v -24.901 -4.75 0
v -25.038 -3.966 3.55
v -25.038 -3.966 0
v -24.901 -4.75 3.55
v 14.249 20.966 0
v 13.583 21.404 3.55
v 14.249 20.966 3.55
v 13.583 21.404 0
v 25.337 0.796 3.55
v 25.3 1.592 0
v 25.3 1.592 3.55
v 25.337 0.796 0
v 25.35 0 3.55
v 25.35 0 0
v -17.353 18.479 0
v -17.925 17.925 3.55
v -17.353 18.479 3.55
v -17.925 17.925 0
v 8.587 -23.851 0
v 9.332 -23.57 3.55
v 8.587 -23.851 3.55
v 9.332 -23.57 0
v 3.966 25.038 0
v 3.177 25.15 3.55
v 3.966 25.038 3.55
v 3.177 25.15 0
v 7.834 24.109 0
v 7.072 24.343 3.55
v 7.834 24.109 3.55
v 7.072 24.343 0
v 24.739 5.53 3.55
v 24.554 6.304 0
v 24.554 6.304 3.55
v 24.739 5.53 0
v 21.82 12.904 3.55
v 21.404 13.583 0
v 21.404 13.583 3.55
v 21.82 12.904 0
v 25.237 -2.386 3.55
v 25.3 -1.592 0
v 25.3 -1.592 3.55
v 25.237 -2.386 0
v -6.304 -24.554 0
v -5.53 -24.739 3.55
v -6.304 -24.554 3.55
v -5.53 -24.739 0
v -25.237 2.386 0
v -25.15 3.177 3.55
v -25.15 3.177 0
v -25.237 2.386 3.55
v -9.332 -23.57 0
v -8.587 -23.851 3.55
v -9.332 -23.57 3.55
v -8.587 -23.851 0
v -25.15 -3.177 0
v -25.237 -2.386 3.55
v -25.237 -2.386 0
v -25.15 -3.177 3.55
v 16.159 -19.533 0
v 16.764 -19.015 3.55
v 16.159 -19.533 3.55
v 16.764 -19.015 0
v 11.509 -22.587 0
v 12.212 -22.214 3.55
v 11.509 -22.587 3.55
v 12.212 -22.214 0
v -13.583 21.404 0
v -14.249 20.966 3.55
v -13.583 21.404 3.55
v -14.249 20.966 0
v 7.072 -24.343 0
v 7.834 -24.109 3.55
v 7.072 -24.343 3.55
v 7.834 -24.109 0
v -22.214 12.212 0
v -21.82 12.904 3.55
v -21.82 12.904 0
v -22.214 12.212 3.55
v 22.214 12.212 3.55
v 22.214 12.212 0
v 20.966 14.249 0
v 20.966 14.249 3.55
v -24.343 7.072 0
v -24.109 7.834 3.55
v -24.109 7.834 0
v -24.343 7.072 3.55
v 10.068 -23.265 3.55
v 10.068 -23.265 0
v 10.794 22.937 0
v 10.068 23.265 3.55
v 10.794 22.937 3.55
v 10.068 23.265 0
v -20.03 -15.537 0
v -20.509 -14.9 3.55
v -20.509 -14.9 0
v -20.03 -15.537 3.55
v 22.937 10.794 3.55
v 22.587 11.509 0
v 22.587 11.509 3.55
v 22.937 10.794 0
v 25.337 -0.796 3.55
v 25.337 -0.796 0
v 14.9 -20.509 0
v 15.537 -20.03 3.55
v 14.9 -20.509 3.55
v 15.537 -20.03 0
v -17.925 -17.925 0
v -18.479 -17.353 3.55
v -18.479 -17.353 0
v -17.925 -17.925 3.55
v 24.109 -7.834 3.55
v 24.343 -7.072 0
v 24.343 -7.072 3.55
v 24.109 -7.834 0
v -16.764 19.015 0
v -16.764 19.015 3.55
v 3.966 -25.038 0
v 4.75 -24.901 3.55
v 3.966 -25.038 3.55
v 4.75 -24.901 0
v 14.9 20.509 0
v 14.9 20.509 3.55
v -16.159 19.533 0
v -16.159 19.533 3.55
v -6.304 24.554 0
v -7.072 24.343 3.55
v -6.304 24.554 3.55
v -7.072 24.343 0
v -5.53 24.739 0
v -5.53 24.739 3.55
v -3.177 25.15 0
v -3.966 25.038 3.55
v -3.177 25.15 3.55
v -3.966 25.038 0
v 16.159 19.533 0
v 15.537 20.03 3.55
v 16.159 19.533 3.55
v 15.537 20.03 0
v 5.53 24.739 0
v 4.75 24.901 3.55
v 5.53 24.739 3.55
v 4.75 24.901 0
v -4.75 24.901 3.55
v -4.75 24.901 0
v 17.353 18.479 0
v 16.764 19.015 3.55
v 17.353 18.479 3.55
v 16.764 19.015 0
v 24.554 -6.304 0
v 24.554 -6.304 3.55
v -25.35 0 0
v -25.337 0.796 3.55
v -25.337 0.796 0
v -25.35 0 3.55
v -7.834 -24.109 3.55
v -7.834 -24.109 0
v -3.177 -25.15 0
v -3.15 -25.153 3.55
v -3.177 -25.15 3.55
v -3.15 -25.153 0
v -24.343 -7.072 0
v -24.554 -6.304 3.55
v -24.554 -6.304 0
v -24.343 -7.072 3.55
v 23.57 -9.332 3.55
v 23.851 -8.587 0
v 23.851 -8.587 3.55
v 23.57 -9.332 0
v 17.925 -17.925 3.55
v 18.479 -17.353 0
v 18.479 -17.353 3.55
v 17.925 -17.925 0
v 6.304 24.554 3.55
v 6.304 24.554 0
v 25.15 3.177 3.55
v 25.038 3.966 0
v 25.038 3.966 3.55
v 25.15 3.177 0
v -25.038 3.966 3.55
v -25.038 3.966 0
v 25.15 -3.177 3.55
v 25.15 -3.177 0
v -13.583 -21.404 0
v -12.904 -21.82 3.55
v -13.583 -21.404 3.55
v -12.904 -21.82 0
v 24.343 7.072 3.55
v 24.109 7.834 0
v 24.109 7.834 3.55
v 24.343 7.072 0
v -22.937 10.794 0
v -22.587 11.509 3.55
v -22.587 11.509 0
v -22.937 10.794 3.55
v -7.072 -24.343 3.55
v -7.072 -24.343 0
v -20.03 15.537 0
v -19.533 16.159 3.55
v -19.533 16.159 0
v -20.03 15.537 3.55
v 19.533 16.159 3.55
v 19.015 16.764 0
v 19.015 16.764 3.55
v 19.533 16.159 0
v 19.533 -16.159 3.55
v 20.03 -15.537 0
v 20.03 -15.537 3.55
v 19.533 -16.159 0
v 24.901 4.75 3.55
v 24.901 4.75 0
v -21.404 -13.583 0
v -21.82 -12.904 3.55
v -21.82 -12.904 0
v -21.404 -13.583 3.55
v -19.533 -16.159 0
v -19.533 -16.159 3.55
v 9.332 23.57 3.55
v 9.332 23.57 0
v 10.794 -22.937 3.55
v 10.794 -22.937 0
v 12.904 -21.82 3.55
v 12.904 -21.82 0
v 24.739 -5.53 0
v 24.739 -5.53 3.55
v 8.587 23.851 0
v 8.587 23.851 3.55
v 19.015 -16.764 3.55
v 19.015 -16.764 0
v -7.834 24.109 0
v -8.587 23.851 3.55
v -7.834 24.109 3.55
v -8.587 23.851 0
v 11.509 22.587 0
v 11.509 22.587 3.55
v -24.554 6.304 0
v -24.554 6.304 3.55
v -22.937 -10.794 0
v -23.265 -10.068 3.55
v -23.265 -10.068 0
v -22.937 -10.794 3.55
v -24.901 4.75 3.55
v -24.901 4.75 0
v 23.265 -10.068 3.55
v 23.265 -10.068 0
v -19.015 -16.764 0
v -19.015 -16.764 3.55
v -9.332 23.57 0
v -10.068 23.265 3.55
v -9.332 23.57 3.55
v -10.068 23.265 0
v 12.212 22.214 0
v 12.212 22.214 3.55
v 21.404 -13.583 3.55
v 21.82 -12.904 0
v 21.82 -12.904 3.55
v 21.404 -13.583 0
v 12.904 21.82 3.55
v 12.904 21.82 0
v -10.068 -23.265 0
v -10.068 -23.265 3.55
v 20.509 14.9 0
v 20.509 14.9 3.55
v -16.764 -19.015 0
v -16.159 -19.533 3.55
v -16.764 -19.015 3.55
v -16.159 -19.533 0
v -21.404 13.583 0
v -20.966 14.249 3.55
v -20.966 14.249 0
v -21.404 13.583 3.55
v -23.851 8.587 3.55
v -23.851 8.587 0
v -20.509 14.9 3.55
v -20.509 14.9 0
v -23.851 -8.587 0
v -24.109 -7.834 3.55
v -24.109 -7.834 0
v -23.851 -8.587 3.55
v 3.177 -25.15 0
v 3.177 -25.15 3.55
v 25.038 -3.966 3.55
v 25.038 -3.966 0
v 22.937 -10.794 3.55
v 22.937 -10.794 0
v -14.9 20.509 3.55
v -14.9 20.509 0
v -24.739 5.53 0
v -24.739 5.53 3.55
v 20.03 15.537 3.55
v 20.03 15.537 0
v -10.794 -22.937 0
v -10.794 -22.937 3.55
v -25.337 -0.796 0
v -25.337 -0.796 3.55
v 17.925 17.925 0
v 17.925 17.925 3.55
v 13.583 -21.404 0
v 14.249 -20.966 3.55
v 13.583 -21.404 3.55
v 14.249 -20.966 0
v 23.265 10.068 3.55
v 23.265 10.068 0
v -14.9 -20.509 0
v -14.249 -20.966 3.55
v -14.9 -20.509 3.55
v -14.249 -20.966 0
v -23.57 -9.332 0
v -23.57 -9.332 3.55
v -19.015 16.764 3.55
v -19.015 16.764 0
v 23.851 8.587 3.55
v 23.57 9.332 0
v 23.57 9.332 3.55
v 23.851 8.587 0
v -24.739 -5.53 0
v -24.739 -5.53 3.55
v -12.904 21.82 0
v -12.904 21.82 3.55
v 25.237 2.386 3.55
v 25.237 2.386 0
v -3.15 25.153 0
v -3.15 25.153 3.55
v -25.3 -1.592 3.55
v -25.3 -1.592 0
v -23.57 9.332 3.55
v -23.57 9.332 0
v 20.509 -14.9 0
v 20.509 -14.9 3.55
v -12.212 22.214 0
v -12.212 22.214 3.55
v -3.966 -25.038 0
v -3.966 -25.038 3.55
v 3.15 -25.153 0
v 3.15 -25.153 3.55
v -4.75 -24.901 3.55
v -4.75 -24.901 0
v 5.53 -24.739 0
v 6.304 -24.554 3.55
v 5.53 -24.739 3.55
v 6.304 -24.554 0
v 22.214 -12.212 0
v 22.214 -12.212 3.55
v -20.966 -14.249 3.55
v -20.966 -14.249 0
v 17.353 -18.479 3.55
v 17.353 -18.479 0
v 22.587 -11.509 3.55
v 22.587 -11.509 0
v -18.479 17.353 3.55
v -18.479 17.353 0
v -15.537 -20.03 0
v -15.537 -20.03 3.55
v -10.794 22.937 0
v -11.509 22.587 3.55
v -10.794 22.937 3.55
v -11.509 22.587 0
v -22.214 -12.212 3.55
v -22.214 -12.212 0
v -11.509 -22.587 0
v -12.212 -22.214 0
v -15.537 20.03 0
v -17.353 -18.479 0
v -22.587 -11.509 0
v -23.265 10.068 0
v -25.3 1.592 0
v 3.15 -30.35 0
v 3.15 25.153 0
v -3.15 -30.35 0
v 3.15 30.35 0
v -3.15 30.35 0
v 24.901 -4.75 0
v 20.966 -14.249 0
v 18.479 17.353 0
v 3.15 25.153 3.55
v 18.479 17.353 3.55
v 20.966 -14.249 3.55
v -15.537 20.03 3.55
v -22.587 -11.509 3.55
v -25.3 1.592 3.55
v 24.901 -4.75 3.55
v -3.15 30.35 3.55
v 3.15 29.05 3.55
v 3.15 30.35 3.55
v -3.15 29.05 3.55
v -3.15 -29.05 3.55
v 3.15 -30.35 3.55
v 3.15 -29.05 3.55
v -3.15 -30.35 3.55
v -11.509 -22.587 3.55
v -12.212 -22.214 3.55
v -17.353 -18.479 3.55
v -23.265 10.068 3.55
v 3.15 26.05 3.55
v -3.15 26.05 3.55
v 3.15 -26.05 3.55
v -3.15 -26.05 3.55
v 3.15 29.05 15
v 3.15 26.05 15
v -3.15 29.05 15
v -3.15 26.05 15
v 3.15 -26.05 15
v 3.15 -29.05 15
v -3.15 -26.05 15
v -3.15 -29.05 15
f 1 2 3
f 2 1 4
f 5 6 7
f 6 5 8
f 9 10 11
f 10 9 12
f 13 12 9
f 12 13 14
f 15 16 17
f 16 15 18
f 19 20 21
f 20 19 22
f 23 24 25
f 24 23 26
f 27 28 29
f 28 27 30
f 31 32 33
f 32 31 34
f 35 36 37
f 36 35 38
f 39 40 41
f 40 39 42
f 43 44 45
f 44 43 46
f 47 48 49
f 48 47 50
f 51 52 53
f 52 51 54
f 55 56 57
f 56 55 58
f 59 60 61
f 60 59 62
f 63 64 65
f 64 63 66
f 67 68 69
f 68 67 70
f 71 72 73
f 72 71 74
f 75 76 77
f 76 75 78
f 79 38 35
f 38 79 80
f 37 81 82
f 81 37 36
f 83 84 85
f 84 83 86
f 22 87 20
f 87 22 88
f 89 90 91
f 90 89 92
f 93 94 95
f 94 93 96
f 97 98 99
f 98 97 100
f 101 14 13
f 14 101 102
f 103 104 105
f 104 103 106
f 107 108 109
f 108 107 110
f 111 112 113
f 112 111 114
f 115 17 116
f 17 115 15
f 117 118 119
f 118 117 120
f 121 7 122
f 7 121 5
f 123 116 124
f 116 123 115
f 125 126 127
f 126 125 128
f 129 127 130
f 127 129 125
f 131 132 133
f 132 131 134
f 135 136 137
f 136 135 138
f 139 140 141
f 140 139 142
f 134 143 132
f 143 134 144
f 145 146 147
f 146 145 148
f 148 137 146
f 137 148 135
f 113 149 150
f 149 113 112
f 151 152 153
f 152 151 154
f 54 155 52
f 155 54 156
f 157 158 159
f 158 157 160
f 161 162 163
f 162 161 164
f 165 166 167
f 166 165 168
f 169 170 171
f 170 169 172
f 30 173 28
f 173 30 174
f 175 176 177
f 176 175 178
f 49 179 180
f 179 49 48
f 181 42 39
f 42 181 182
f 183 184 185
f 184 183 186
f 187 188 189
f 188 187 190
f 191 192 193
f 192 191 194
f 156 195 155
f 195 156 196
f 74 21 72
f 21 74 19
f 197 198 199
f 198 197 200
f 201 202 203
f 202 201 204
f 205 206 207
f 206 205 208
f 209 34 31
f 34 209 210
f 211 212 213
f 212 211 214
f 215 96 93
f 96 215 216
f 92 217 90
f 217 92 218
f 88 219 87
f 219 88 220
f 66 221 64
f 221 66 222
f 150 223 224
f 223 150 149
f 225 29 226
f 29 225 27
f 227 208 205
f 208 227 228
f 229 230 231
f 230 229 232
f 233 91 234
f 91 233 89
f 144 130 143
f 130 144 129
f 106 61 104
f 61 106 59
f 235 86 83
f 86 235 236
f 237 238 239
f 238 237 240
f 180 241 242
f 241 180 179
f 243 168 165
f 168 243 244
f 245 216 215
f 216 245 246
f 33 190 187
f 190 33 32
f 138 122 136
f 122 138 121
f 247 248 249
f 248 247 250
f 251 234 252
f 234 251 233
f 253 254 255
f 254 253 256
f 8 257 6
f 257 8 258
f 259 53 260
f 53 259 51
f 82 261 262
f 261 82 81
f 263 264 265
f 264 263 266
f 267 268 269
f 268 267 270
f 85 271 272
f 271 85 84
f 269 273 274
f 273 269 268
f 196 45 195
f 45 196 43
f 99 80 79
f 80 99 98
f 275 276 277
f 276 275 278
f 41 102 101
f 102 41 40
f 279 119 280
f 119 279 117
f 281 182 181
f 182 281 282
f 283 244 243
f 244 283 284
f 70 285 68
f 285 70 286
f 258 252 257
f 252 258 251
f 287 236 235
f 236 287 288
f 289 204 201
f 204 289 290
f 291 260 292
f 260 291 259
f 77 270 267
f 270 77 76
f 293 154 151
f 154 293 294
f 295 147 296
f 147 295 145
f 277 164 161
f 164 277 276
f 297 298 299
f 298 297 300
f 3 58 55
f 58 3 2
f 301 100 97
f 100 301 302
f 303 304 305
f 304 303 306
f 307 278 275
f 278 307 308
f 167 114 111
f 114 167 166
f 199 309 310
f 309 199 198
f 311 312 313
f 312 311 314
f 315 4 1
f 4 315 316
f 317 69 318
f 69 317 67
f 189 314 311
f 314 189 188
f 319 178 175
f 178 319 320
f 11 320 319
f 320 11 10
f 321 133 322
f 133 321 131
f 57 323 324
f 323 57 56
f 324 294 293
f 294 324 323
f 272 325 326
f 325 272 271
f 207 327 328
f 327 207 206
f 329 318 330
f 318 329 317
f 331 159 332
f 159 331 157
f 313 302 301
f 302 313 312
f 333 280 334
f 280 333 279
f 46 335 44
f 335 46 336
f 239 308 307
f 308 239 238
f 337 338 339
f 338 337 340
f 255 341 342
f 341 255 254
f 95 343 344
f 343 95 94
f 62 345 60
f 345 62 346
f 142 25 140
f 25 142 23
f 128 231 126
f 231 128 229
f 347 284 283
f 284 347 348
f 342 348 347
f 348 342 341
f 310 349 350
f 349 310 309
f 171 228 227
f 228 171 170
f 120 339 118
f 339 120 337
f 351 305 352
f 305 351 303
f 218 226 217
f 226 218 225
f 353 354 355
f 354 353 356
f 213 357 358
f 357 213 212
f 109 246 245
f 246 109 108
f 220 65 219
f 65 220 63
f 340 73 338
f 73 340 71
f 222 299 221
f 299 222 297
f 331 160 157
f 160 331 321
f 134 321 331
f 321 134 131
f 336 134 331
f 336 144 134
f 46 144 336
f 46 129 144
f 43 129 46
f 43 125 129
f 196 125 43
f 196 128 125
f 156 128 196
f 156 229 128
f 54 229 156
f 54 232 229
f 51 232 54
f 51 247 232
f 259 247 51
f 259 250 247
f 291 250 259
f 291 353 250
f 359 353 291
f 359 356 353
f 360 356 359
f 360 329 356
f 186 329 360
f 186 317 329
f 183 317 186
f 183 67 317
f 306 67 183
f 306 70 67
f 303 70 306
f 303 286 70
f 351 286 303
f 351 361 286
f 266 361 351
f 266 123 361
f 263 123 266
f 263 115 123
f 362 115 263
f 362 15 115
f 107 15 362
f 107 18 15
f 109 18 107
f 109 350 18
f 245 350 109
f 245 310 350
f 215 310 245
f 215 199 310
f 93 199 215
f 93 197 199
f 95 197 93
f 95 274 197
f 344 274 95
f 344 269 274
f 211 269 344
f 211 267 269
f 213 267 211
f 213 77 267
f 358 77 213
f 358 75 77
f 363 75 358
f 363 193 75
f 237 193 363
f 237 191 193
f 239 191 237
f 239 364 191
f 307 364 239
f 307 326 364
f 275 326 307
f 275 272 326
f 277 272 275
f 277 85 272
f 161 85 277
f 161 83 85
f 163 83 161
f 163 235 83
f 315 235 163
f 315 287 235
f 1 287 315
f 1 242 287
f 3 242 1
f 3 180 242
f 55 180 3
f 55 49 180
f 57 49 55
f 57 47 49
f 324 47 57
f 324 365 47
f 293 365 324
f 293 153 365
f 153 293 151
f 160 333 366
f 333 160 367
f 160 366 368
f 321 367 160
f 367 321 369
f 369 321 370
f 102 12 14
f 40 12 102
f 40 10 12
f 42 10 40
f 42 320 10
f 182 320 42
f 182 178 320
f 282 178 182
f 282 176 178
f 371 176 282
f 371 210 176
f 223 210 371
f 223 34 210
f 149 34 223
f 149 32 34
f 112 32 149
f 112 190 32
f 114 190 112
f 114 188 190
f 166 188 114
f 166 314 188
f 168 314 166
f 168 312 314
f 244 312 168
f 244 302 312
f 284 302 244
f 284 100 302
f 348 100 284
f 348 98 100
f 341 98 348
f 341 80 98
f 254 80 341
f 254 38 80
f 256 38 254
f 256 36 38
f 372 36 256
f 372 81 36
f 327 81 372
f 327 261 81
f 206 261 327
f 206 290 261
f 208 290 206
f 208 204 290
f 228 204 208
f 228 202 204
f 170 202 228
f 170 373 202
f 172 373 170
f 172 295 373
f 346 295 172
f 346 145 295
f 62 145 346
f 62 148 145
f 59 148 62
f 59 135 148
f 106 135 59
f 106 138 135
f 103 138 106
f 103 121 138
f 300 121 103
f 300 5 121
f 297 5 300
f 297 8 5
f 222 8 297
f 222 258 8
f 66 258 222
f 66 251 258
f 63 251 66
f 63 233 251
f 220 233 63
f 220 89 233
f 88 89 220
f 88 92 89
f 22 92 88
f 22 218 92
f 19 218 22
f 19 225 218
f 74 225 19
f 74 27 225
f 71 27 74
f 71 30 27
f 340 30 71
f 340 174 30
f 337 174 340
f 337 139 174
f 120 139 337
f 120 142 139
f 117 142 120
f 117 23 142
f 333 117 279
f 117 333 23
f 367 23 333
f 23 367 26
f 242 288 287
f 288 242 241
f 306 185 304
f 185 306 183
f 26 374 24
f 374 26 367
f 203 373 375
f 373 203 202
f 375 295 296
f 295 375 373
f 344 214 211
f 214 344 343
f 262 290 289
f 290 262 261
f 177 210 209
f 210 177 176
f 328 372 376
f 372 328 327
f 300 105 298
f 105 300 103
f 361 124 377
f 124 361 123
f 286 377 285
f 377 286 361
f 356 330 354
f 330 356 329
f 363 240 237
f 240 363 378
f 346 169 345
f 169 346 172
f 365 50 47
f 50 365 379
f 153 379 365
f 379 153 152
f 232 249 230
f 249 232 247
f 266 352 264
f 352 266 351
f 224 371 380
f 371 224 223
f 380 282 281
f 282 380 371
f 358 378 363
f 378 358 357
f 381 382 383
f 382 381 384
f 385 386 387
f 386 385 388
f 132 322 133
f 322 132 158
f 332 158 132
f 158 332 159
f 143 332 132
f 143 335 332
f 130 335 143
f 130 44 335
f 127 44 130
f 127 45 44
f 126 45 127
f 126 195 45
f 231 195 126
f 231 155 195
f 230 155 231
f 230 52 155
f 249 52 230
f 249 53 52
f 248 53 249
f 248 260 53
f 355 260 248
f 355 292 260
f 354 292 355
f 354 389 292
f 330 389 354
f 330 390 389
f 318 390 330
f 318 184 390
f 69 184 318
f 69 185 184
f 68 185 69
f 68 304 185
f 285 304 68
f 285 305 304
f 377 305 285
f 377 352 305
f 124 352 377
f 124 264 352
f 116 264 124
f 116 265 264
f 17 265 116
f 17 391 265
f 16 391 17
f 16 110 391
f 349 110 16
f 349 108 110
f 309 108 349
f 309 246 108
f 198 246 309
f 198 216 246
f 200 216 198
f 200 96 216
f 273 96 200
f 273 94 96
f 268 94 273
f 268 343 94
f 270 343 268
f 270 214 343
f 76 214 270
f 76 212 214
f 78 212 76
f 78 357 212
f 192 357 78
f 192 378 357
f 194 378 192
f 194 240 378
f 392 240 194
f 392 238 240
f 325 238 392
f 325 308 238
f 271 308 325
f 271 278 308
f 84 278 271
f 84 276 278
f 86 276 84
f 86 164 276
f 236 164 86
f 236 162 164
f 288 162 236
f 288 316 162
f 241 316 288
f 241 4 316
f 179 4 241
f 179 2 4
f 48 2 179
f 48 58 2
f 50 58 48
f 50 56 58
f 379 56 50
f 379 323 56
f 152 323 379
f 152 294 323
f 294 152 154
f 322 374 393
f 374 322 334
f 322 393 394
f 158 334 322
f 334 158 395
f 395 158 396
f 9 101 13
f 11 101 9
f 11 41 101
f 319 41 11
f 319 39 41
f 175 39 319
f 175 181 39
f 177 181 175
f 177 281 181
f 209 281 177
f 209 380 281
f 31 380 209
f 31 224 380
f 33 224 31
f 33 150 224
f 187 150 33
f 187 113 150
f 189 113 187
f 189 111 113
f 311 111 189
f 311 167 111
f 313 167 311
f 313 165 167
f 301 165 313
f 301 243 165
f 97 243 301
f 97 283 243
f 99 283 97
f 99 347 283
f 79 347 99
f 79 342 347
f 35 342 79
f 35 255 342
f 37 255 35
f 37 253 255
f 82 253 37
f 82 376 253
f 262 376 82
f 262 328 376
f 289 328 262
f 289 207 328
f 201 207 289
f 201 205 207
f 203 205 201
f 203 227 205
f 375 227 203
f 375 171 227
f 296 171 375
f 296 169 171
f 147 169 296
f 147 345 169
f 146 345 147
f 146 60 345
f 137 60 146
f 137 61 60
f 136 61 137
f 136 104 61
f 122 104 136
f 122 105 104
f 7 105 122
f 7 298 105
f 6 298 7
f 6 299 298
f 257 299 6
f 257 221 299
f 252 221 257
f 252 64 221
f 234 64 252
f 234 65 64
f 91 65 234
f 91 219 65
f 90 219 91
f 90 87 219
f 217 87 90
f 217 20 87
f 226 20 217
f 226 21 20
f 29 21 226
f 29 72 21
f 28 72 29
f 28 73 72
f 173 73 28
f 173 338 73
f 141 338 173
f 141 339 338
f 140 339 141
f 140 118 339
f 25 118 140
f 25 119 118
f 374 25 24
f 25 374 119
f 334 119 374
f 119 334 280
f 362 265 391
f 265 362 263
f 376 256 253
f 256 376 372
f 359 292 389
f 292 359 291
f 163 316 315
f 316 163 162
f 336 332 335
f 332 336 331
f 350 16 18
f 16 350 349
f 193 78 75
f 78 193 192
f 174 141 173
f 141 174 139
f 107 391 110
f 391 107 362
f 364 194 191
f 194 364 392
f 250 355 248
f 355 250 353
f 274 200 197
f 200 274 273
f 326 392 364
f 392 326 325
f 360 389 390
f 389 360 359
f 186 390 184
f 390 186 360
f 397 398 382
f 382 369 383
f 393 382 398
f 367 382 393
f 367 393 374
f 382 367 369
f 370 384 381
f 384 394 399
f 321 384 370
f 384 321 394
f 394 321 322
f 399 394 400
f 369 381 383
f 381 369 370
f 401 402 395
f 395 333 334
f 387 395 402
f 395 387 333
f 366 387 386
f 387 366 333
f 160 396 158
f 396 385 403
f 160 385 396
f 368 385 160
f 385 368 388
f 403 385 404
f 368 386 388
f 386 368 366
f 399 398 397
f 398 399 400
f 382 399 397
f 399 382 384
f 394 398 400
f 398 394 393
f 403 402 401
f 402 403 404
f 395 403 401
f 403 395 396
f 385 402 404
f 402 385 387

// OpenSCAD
// --- Main Parameters ---

// Dimensions for the cap body.

disc_diameter = 50.7;      // [mm] The overall diameter of the cap.
bottom_disc_height = 3.55; // [mm] The height of the full-disc base.
extra_width = 0.7;


// Prong 2 dimensions (outward-facing, on the round side)

prong2_width = 6.3;
prong2_thickness = 3;
prong2_height = 15;      // The total height of this prong from the base.

// Reinforcement for Prong 2

prong2_connector_thickness = 1; // [mm] Thickness of the base that connects prong 2.


// --- Model ---



// Calculated values

disc_radius = disc_diameter / 2;
cutter_size = disc_diameter * 1.5;

// Use union() to combine all parts into one object.

union() {

    // 1. The main body (bottom disc + top part with cuts)
    cylinder(h = bottom_disc_height, d = disc_diameter, $fn=200);

    // 2. 
    // This creates a solid, flat base for the prong to attach to.
    translate([
        -prong2_width / 2,                          // Match the prong's width and position
        disc_radius - prong2_connector_thickness,   // Sit behind the disc edge
        0                                           // Start from the bottom
    ]) {
        // The block is as wide as the prong and as tall as the main cap body.
        cube([prong2_width, prong2_connector_thickness*6, bottom_disc_height]);
    }
    // also the other side gets the nub
        translate([
        -prong2_width / 2,                          // Match the prong's width and position
        -disc_radius + prong2_connector_thickness - 6*prong2_connector_thickness,   // Sit behind the disc edge
        0                                           // Start from the bottom
    ]) {
        // The block is as wide as the prong and as tall as the main cap body.
        cube([prong2_width, prong2_connector_thickness*6, bottom_disc_height]);
    }
    // 4. Prong 1 (outward-facing, on positive-Y side)
    translate([
        -prong2_width / 2,
        disc_radius + extra_width,
        0
    ]) {
        cube([prong2_width, prong2_thickness, prong2_height]);
    }
    
       // 4. Prong 2 (outward-facing, on positive-Y side)
    translate([
        -prong2_width / 2,
        -disc_radius- prong2_thickness - extra_width,
        0
    ]) {
        cube([prong2_width, prong2_thickness, prong2_height]);
    }

}
